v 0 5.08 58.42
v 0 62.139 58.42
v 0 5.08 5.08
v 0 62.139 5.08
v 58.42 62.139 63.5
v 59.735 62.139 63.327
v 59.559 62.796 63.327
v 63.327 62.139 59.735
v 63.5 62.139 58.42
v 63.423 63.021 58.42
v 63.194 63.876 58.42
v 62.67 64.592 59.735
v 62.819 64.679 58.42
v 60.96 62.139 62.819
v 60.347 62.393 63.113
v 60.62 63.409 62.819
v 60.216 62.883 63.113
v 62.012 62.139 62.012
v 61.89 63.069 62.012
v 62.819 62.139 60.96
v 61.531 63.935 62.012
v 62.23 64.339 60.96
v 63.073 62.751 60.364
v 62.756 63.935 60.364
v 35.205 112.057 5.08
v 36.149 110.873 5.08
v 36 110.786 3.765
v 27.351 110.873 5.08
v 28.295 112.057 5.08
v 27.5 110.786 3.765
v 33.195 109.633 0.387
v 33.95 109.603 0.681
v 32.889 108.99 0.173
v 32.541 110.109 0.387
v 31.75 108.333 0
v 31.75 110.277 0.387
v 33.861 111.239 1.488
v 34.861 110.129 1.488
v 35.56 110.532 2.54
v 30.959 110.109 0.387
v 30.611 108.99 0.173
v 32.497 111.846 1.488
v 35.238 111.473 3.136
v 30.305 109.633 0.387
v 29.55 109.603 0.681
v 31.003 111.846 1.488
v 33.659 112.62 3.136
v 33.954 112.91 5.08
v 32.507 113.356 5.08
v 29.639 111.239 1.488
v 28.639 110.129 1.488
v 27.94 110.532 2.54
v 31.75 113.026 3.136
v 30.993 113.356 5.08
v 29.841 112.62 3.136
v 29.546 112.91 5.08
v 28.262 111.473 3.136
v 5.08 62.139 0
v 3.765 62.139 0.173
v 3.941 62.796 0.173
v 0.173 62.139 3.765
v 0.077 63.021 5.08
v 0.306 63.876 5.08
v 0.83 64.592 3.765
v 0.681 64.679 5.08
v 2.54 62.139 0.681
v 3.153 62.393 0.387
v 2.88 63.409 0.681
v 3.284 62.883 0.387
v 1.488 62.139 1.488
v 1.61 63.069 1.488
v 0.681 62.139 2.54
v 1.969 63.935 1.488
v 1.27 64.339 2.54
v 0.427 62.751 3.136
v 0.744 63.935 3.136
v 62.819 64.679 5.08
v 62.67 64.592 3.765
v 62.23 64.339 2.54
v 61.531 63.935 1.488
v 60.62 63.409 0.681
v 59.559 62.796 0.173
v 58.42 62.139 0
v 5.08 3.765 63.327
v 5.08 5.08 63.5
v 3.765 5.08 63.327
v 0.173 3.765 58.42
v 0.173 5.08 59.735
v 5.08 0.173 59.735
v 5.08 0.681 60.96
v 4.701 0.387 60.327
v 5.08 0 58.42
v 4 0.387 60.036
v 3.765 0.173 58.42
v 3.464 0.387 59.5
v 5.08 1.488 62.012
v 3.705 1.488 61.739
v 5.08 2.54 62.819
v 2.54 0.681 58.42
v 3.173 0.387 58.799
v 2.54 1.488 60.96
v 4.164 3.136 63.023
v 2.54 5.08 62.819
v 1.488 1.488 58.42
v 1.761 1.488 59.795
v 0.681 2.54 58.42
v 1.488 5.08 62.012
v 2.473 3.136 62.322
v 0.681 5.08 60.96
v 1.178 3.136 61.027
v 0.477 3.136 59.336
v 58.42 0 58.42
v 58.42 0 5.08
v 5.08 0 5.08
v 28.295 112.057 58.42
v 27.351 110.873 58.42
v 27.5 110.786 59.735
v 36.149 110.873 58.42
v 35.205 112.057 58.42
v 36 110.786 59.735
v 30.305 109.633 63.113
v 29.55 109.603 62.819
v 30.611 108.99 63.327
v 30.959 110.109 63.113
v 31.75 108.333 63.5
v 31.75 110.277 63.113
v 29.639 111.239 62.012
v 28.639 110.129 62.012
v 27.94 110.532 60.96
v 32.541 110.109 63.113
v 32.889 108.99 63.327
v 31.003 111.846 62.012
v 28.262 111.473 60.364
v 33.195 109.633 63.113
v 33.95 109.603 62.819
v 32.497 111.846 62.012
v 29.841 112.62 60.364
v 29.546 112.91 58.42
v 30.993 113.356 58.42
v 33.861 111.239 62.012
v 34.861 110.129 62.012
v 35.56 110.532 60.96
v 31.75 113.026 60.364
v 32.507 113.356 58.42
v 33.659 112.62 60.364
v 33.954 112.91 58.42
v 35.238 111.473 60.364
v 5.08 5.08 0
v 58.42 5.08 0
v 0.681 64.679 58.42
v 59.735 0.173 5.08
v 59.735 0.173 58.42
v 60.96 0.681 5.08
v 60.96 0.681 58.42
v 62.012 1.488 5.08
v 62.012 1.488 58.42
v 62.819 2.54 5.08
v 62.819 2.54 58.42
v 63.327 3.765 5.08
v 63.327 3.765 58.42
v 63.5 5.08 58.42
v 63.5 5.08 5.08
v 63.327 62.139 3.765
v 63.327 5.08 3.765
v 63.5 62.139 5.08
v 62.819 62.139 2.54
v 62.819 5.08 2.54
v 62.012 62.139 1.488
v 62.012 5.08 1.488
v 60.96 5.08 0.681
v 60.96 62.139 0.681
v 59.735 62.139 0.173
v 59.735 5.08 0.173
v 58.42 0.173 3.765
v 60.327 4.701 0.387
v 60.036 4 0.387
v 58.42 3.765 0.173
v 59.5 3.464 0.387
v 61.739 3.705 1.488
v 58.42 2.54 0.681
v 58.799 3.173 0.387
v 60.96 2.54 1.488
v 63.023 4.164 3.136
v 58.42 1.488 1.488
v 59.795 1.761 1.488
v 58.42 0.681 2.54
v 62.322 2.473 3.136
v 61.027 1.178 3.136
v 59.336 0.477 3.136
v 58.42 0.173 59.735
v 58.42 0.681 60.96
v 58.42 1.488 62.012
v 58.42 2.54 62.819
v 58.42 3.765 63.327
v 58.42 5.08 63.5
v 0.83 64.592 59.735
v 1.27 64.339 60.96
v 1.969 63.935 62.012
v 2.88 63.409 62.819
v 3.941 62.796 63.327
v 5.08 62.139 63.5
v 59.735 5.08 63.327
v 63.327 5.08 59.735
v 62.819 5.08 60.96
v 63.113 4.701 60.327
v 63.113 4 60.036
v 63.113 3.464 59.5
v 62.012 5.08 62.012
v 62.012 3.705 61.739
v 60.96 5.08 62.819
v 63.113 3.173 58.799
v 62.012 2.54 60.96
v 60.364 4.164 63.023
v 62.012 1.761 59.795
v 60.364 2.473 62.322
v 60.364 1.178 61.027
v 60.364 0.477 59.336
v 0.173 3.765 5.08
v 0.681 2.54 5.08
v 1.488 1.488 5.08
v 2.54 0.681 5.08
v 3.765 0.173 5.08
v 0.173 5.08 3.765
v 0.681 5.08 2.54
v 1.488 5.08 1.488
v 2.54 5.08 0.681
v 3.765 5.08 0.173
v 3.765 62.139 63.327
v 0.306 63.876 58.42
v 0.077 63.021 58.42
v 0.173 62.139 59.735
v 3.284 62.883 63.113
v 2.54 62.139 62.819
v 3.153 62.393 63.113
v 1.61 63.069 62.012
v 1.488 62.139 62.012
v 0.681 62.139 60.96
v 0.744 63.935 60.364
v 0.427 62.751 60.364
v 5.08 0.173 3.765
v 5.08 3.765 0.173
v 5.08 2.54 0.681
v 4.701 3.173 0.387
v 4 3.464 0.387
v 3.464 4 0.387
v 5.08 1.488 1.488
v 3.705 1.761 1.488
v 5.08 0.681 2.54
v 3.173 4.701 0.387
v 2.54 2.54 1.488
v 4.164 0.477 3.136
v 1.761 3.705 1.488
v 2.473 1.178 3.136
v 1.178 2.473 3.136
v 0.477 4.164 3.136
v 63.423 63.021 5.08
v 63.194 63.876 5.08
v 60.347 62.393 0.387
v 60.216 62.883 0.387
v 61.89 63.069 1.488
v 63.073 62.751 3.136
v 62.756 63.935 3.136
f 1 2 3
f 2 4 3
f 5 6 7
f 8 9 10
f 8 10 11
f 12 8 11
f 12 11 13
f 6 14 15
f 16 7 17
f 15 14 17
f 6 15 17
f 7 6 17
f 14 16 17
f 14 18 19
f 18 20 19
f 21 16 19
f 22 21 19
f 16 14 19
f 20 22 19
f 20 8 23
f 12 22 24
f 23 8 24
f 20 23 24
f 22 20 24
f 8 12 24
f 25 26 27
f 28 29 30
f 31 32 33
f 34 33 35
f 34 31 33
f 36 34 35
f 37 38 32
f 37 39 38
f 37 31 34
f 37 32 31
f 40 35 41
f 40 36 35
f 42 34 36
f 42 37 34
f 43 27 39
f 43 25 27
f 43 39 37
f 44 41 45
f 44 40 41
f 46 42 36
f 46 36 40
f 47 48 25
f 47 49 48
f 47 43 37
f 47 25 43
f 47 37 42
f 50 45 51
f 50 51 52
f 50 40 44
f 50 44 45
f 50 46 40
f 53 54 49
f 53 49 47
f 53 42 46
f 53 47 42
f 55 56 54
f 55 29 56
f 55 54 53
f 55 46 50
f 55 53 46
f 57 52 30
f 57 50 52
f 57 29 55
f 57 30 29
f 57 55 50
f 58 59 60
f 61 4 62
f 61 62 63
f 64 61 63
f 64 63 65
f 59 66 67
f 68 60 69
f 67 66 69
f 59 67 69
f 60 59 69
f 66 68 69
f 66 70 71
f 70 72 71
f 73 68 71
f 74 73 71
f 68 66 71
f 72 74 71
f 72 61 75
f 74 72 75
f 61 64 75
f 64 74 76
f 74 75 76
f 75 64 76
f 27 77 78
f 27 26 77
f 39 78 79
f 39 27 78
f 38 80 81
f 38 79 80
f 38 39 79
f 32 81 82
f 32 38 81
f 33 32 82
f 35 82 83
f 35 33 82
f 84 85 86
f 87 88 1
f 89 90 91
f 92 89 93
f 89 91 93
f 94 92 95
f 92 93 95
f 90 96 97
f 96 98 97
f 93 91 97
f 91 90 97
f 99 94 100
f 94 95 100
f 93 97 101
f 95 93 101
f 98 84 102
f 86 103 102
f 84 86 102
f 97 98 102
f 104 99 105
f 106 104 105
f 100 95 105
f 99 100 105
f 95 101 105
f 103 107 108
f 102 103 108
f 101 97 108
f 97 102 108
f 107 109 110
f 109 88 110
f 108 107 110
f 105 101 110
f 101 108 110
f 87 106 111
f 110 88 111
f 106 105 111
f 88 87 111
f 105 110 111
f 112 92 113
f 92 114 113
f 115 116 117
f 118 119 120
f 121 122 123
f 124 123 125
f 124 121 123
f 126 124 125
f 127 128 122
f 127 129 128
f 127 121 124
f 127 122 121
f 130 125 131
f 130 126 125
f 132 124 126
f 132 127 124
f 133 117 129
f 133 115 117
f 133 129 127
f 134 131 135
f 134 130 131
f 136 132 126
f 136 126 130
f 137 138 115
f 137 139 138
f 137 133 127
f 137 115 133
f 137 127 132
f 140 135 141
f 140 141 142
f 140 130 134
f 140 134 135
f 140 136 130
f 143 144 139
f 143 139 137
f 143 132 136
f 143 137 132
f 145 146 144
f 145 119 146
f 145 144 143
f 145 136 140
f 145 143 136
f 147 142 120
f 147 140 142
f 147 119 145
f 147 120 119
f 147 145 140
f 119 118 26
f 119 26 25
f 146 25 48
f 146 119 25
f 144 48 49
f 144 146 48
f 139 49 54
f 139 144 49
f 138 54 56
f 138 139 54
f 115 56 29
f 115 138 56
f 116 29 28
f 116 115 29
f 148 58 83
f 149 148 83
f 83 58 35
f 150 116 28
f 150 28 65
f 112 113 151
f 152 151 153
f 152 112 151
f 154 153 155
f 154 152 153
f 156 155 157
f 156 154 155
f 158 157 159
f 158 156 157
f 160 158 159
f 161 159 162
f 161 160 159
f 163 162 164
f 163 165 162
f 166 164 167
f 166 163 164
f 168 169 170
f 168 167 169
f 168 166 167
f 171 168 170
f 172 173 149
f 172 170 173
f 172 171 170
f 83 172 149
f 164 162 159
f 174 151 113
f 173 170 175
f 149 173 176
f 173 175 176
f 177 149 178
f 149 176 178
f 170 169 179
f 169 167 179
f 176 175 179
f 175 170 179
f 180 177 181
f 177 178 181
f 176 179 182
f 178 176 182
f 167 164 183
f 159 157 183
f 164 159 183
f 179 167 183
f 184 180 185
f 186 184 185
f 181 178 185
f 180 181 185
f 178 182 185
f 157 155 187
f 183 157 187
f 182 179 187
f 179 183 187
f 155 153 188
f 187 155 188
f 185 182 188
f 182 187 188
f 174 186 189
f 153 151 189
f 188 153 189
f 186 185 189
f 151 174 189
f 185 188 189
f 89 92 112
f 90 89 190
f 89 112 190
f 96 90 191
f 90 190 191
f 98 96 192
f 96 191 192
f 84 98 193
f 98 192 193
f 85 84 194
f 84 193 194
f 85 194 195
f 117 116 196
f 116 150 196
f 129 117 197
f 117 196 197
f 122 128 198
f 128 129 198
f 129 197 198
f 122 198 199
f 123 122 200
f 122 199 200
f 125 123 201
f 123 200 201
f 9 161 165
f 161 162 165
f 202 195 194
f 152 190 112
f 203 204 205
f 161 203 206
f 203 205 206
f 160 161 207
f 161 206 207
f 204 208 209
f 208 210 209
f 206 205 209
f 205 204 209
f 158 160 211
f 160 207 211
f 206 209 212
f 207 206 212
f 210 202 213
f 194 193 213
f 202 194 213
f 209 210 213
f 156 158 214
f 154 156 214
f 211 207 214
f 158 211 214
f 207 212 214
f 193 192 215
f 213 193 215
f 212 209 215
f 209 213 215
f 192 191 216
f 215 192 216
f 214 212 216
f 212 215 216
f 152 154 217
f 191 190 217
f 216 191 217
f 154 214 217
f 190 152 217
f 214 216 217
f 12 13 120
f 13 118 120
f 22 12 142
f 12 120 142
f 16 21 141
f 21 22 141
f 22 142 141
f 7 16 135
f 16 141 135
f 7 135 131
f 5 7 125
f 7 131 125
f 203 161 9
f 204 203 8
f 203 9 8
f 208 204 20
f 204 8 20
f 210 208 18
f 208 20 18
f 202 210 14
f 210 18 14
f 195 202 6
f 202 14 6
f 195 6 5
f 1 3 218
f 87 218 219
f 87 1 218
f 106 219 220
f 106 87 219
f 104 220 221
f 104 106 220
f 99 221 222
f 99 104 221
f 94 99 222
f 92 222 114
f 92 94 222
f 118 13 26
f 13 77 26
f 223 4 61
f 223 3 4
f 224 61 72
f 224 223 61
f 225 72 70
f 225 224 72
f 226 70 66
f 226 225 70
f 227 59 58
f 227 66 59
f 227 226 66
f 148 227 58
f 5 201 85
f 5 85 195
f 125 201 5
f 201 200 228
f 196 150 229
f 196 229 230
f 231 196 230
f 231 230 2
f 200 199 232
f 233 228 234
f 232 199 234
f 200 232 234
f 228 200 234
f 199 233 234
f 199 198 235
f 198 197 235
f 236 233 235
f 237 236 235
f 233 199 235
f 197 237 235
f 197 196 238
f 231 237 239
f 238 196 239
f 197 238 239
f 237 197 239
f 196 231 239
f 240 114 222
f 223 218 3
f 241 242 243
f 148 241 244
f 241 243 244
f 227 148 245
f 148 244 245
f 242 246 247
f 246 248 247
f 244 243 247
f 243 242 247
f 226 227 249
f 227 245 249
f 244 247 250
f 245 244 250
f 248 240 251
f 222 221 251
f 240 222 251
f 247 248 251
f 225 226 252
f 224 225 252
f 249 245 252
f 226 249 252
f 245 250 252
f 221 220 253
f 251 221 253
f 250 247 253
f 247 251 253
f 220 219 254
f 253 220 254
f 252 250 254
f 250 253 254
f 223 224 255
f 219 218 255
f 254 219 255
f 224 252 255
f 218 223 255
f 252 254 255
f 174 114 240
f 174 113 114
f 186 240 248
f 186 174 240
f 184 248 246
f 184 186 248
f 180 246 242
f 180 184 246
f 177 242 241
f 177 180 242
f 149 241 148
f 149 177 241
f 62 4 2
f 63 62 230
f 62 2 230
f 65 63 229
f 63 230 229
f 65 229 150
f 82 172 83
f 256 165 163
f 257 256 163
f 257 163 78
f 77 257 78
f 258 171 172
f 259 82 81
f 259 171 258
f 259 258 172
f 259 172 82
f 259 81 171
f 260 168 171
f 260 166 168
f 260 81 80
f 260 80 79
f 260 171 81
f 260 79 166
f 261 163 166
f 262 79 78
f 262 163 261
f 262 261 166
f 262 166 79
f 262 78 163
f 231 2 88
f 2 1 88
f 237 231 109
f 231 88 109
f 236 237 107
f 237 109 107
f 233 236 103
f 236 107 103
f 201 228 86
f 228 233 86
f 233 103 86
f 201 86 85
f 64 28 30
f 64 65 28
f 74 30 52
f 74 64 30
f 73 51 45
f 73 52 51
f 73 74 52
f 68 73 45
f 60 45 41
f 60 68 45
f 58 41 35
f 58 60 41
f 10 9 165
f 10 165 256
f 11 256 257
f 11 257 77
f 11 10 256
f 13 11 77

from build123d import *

# Parameters (mm, degrees)
F1_DEPTH = 63.5
F2_R     = 5.08


with BuildPart() as f1:
    # F0 (on Top) → F1 (new body)
    with BuildSketch(Plane.XY):
        Polygon((0, 63.5), (0, 0), (63.5, 0), (63.5, 63.5), (31.75, 118.492613), align=None)
    extrude(amount=F1_DEPTH)

    # F2
    f2_edges = [f1.edges().sort_by_distance(p)[0] for p in [
        (15.875, 90.996307, 63.5),
        (0, 31.75, 63.5),
        (31.75, 0, 63.5),
        (63.5, 31.75, 63.5),
        (47.625, 90.996307, 63.5),
        (63.5, 0, 31.75),
        (63.5, 63.5, 31.75),
        (63.5, 31.75, 0),
        (31.75, 118.492613, 31.75),
        (47.625, 90.996307, 0),
        (0, 0, 31.75),
        (31.75, 0, 0),
        (0, 63.5, 31.75),
        (0, 31.75, 0),
        (15.875, 90.996307, 0),
    ]]
    fillet(f2_edges, radius=F2_R)


solid = f1.part
